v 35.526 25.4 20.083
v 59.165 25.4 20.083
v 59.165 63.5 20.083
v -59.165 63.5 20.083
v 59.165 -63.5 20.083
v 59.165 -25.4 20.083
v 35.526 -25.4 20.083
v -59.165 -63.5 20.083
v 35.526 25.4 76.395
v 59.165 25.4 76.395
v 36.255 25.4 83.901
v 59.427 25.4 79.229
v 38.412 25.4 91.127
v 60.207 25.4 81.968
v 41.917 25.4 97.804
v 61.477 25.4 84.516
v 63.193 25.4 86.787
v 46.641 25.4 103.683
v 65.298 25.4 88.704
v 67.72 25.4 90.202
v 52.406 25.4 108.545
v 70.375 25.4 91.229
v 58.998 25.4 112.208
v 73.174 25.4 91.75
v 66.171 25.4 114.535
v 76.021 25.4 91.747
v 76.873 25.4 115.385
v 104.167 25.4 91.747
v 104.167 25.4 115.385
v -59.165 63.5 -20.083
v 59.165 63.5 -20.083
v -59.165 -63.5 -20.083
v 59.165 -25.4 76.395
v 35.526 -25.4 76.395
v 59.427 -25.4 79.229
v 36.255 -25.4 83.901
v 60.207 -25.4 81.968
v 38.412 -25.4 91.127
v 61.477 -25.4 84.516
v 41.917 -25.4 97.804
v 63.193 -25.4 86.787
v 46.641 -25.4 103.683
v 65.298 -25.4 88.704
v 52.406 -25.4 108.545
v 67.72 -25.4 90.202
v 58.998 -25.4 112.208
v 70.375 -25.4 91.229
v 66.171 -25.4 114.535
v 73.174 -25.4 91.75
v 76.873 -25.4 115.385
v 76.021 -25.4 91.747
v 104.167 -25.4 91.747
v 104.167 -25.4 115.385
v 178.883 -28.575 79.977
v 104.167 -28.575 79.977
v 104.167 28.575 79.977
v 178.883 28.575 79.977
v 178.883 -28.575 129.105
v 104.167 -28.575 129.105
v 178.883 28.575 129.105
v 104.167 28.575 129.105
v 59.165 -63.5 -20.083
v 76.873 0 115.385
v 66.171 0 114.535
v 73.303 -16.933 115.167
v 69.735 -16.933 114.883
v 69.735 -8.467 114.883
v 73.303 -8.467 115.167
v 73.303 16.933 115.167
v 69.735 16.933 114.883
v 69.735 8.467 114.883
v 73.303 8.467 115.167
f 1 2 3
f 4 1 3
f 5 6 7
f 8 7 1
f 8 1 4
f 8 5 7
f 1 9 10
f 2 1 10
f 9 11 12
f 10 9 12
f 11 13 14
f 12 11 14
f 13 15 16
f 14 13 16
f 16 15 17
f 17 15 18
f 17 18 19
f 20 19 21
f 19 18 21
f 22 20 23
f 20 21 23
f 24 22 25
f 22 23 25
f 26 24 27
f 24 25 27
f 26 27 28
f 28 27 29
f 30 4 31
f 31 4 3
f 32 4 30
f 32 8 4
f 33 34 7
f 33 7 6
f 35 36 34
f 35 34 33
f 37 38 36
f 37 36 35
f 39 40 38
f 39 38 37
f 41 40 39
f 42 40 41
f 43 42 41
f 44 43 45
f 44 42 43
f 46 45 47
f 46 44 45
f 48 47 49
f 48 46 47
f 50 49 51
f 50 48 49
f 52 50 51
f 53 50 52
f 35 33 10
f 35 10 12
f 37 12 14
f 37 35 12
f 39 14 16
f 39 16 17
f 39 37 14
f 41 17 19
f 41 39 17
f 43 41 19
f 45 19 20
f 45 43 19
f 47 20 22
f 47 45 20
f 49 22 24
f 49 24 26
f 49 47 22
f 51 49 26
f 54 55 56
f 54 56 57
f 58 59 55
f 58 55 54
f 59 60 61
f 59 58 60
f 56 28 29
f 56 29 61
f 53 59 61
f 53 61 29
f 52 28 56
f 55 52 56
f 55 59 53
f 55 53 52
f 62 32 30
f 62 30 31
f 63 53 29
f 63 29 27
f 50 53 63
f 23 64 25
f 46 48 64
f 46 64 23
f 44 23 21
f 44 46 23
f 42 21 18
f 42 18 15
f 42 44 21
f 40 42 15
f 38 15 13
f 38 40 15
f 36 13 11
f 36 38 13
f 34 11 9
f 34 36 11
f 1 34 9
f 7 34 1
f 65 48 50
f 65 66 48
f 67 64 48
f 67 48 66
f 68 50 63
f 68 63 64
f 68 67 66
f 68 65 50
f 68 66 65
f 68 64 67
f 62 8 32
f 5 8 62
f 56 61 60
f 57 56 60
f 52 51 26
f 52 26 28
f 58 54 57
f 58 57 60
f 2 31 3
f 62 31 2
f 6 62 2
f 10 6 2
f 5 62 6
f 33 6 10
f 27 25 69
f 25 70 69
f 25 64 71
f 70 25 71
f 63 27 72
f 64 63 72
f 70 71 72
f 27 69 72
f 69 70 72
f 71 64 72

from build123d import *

# Parameters (mm, degrees)
F1_DEPTH = 63.5
F2_DEPTH = 25.4
F0_W     = 37.3578295112
F0_H     = 13.7197794846
F0_H_2   = 23.6380351254
F0_H_3   = 11.7702707648
F3_DEPTH = 28.575


with BuildPart() as f1:
    # F0 (on Front) → F1 (new body, symmetric)
    with BuildSketch(Plane.XZ):
        Polygon((35.526488953, 20.0833715498), (-59.1645240784, 20.0833715498), (-59.1645240784, -20.0833715498), (59.1645240784, -20.0833715498), (59.1645240784, 20.0833715498), align=None)
    extrude(amount=F1_DEPTH, both=True)

    # F0 (on Front) → F2 (join, symmetric)
    with BuildSketch(Plane.XZ):
        with BuildLine():
            Line((35.526488953, 76.3945057988), (35.526488953, 20.0833715498))
            Line((35.526488953, 20.0833715498), (59.1645240784, 20.0833715498))
            Line((59.1645240784, 20.0833715498), (59.1645240784, 76.3945057988))
            ThreePointArc((59.1645240784, 76.3945057988), (64.2012826279, 87.7945426192), (76.0210826993, 91.7470231652))
            Line((76.0210826993, 91.7470231652), (104.1673794389, 91.7470231652))
            Line((104.1673794389, 91.7470231652), (104.1673794389, 115.3850582906))
            Line((104.1673794389, 115.3850582906), (76.8725928536, 115.3850582906))
            add(Edge.make_bspline(
                [(66.1712992482, 114.5353537972), (69.7326775282, 114.9157218144), (73.3029348697, 115.1988448631), (76.8725928536, 115.3850582906)],
                knots=[156.3347304478, 156.3347304478, 156.3347304478, 156.3347304478, 166.0978888451, 166.0978888451, 166.0978888451, 166.0978888451], degree=3))
            ThreePointArc((66.1712992482, 114.5353537972), (44.1367599152, 100.8578900908), (35.526488953, 76.3945057988))
        make_face()
    extrude(amount=F2_DEPTH, both=True)

    # F0 (on Front) → F3 (join, symmetric)
    with BuildSketch(Plane.XZ):
        with Locations((122.8462941945, 122.2449480329)):
            Rectangle(F0_W, F0_H)
        with Locations((122.8462941945, 103.5660407279)):
            Rectangle(F0_W, F0_H_2)
        with Locations((122.8462941945, 85.8618877828)):
            Rectangle(F0_W, F0_H_3)
        Polygon((141.52520895, 129.1048377752), (141.52520895, 115.3850582906), (141.52520895, 91.7470231652), (141.52520895, 79.9767524004), (178.8830384612, 79.9767524004), (178.8830384612, 129.1048377752), align=None)
    extrude(amount=F3_DEPTH, both=True)


solid = f1.part
